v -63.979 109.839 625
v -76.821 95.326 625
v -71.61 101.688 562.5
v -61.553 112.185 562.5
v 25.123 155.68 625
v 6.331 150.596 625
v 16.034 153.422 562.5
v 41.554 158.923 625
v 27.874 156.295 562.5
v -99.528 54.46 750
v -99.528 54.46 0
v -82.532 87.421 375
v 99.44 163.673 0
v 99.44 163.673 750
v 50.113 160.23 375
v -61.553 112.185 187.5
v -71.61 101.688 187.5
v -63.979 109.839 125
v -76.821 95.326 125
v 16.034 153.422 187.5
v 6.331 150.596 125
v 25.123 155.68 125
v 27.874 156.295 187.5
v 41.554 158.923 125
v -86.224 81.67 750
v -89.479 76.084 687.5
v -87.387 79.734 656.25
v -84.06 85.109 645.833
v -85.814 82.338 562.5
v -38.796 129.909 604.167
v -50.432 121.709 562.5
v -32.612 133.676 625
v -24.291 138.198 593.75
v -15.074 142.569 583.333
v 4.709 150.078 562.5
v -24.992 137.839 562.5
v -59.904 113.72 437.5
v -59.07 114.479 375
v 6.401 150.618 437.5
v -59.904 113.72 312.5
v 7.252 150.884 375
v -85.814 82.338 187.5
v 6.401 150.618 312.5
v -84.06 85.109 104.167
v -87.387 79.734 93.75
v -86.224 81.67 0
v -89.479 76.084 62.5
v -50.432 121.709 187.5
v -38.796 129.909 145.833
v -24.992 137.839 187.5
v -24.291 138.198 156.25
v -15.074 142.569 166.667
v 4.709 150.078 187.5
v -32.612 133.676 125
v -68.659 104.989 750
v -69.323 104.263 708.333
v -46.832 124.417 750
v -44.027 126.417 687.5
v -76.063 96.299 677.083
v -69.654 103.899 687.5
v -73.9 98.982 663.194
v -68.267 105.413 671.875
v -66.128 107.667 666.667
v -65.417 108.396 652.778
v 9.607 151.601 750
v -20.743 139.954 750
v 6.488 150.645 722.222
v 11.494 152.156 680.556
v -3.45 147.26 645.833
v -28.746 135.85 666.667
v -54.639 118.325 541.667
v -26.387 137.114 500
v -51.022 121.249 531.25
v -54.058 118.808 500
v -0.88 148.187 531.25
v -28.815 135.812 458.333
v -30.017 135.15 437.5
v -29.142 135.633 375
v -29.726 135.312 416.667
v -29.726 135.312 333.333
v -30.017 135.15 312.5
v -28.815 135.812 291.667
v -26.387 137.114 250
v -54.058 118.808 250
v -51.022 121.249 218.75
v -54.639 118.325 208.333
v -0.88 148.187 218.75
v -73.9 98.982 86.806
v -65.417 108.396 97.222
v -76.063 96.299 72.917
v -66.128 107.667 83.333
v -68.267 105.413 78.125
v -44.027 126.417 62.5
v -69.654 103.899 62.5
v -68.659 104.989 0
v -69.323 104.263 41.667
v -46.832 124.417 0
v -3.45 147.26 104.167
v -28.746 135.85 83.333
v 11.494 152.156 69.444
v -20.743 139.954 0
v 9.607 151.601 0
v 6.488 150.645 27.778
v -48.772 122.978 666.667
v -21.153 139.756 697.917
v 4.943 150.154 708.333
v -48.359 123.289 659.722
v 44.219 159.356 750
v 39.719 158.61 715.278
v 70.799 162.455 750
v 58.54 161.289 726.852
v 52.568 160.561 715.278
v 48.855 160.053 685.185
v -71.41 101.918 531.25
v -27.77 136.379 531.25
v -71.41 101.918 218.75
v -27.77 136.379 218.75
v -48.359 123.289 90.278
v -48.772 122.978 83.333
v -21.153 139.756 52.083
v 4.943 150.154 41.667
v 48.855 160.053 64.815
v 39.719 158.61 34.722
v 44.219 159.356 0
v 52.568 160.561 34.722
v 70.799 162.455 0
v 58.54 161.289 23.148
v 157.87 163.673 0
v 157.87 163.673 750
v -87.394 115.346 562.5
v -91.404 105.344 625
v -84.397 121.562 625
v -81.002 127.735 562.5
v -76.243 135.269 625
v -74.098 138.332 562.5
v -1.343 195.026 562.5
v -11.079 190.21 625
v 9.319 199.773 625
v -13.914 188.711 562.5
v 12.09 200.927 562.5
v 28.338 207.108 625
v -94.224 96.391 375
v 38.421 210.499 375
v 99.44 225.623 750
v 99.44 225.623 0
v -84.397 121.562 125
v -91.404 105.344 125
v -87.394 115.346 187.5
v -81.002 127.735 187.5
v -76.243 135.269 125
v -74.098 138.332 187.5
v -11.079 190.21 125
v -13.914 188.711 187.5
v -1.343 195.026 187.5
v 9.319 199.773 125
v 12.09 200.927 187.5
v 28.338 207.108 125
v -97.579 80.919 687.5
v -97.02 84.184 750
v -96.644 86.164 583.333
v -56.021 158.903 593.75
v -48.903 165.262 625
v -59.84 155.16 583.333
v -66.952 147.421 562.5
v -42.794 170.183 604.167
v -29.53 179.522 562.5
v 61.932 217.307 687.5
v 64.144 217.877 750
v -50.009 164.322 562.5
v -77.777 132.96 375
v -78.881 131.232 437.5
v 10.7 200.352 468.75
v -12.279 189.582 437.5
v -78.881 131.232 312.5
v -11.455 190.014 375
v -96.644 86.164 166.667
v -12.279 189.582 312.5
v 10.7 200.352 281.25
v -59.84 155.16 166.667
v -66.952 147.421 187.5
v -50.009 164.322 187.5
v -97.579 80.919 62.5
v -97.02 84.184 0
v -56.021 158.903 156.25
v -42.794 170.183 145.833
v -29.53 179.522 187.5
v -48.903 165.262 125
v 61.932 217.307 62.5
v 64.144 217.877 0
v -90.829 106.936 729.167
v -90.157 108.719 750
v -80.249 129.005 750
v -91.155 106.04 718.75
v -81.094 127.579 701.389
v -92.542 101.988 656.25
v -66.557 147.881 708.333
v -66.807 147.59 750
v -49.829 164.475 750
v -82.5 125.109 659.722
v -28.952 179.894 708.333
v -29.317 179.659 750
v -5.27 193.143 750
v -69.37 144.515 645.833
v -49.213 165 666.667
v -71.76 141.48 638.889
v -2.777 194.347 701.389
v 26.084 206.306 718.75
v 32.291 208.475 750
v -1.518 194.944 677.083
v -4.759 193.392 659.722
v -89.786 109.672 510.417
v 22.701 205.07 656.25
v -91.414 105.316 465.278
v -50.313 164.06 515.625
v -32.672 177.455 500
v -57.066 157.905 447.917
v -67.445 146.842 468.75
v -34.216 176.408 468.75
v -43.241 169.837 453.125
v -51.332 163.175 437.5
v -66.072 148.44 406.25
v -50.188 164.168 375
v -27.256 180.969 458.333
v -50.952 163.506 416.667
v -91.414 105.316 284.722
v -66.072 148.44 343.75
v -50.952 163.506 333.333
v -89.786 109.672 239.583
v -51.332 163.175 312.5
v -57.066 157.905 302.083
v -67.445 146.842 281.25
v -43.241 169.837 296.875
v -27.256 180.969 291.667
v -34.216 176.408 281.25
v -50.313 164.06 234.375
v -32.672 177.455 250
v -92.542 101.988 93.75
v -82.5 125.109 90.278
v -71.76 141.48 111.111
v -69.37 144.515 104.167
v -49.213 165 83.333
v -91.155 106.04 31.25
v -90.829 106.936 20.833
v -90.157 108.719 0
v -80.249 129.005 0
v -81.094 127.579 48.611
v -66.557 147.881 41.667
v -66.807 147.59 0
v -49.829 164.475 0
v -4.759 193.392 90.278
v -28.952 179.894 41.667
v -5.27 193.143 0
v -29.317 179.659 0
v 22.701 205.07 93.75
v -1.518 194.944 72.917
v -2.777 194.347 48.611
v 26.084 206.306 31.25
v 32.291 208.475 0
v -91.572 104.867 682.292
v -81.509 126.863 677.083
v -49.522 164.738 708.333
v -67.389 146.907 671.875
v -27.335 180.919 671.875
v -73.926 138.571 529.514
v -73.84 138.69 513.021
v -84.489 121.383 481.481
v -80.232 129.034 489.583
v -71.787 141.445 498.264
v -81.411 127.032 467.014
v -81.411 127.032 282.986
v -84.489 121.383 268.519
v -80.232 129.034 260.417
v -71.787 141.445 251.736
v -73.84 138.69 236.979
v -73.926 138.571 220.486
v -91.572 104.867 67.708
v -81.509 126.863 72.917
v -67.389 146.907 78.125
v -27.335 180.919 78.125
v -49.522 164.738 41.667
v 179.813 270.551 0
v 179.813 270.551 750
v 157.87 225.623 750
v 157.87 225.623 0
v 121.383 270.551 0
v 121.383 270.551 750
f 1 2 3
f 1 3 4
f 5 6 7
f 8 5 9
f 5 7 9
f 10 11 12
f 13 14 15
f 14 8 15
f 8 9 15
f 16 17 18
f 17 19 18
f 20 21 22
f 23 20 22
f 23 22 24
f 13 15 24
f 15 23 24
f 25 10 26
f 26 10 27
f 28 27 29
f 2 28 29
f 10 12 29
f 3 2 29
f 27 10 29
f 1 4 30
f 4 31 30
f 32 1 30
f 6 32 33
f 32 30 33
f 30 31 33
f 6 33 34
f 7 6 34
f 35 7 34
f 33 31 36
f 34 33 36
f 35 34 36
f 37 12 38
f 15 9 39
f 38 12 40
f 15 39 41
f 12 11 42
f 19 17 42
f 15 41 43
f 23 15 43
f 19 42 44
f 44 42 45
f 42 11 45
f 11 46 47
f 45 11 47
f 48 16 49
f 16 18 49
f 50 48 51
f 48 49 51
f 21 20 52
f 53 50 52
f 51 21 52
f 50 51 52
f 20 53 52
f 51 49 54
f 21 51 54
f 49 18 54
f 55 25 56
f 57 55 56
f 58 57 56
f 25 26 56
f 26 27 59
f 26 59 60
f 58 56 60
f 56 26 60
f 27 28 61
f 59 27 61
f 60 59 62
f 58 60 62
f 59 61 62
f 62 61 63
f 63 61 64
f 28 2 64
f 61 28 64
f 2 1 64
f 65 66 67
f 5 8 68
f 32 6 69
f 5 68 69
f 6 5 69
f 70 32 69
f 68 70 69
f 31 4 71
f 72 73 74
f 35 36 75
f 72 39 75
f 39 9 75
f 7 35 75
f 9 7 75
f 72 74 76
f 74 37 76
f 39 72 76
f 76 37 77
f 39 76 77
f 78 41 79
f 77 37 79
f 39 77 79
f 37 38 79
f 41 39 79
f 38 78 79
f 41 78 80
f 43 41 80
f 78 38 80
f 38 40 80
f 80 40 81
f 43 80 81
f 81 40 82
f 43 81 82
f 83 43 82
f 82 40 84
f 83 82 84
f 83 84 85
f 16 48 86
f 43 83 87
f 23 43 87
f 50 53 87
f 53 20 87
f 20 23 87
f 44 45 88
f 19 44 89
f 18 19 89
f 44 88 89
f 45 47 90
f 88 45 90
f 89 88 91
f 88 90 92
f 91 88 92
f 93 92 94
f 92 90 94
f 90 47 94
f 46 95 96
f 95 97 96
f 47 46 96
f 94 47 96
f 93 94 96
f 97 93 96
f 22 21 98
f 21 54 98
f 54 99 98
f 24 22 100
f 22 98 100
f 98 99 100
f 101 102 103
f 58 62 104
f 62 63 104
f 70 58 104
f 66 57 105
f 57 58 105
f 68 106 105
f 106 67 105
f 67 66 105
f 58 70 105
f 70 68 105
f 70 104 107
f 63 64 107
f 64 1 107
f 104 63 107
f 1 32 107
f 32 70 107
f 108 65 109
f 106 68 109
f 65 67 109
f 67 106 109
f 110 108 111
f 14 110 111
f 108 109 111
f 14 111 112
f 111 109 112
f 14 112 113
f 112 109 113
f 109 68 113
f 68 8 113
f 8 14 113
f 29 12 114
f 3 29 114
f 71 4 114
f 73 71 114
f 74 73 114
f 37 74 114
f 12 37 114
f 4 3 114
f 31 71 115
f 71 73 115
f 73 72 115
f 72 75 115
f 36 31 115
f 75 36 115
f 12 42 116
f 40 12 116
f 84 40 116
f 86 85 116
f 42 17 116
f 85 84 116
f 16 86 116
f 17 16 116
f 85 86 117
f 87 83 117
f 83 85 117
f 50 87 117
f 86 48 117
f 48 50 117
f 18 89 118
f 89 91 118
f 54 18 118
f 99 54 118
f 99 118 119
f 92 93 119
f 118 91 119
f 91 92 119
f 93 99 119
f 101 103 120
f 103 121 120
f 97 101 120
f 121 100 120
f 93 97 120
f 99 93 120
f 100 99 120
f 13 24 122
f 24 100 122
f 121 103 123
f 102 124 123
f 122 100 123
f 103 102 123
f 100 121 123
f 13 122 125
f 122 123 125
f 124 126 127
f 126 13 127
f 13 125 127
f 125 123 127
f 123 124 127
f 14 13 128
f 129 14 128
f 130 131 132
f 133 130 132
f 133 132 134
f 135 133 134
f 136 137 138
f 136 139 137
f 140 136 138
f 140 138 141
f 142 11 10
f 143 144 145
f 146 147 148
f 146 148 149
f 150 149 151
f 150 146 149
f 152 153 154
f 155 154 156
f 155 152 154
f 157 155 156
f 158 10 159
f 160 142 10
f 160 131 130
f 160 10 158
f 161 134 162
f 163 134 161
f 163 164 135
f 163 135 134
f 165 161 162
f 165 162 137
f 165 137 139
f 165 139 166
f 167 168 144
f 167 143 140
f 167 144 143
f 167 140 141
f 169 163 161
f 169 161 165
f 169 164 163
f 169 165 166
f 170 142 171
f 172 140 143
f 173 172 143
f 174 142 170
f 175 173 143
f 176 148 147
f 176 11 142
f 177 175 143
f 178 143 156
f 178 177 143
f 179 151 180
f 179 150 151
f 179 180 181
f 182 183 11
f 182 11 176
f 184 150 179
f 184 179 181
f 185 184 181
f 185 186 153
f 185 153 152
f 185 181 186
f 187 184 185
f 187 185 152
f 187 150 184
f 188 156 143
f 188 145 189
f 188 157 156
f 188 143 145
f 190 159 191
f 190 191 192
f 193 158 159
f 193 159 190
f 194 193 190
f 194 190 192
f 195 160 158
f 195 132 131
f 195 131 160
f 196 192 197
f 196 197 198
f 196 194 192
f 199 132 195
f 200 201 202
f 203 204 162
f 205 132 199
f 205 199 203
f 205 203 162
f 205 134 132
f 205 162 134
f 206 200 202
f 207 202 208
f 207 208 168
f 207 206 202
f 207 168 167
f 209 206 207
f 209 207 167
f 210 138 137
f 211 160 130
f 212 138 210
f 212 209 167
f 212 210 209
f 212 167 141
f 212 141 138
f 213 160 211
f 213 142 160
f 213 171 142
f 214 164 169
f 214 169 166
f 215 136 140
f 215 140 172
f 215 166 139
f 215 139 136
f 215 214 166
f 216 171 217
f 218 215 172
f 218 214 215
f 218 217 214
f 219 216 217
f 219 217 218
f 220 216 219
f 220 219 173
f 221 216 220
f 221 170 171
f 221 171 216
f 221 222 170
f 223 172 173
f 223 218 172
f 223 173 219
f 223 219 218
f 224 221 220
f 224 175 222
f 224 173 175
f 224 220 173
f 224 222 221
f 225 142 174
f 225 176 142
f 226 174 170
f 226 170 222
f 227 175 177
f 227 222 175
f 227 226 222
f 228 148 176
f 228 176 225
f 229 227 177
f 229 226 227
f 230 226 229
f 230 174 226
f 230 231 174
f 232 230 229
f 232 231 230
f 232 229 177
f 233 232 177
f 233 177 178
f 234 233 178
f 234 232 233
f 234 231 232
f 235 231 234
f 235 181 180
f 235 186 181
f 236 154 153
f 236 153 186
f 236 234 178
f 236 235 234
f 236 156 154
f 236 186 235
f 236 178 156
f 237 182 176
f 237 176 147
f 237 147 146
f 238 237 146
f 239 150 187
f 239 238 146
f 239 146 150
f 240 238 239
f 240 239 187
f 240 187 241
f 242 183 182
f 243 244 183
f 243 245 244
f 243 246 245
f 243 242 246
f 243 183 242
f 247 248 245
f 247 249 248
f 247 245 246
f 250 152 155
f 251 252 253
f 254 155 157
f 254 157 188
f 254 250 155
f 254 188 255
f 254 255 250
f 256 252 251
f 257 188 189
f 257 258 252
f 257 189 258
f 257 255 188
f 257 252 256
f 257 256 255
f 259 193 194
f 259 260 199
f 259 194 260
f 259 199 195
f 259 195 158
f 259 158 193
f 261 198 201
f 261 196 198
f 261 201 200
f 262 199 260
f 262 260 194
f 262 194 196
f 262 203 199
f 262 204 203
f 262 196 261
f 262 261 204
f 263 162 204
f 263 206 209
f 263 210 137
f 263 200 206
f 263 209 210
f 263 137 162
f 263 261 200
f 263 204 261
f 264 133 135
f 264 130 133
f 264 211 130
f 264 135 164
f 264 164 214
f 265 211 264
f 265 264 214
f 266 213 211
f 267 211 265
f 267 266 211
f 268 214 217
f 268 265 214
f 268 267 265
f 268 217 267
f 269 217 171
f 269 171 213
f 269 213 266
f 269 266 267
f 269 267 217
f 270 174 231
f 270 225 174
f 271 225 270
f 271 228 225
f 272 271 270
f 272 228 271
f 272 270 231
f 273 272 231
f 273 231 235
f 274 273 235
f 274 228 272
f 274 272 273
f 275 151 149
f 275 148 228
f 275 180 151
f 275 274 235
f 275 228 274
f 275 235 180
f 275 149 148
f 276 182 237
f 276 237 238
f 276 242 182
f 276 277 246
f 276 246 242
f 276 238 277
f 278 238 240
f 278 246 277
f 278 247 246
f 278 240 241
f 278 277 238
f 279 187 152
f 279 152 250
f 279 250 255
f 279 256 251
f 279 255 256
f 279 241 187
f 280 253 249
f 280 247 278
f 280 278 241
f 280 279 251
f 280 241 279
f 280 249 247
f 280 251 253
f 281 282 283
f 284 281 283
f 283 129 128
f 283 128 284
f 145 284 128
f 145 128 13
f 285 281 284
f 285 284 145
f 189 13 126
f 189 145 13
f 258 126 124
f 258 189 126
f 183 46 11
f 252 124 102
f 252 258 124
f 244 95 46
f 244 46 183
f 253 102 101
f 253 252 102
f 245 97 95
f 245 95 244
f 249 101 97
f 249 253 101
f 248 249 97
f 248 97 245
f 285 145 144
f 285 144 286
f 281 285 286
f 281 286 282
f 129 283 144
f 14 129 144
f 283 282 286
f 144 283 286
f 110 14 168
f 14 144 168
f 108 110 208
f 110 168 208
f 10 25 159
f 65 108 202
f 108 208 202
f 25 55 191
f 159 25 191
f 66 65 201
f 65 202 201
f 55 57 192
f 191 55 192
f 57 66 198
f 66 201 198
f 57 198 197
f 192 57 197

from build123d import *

# Parameters (mm, degrees)
SKETCH1_W           = 58.430021541
SKETCH1_H           = 61.949414885
BOSS_EXTRUDE1_DEPTH = 750


with BuildPart() as part:
    # Sketch1 → Boss-Extrude1 (new body)
    with BuildSketch(Plane.XY):
        with BuildLine():
            add(Edge.make_bspline(
                [(-99.527538728, 54.459896253), (-100.331758171, 188.294424486), (99.44017176, 225.622803561)],
                knots=[0, 0, 0, 1, 1, 1], degree=2))
            Line((99.44017176, 225.622803561), (99.44017176, 163.673388676))
            add(Edge.make_bspline(
                [(-99.527538728, 54.459896253), (-58.241038514, 162.199954542), (99.44017176, 163.673388676)],
                knots=[0, 0, 0, 1, 1, 1], degree=2))
        make_face()
        with Locations((128.655182531, 194.648096119)):
            Rectangle(SKETCH1_W, SKETCH1_H)
        Polygon((99.44017176, 225.622803561), (121.383239857, 270.550542905), (179.813261398, 270.550542905), (157.870193301, 225.622803561), align=None)
    extrude(amount=BOSS_EXTRUDE1_DEPTH)


solid = part.part
